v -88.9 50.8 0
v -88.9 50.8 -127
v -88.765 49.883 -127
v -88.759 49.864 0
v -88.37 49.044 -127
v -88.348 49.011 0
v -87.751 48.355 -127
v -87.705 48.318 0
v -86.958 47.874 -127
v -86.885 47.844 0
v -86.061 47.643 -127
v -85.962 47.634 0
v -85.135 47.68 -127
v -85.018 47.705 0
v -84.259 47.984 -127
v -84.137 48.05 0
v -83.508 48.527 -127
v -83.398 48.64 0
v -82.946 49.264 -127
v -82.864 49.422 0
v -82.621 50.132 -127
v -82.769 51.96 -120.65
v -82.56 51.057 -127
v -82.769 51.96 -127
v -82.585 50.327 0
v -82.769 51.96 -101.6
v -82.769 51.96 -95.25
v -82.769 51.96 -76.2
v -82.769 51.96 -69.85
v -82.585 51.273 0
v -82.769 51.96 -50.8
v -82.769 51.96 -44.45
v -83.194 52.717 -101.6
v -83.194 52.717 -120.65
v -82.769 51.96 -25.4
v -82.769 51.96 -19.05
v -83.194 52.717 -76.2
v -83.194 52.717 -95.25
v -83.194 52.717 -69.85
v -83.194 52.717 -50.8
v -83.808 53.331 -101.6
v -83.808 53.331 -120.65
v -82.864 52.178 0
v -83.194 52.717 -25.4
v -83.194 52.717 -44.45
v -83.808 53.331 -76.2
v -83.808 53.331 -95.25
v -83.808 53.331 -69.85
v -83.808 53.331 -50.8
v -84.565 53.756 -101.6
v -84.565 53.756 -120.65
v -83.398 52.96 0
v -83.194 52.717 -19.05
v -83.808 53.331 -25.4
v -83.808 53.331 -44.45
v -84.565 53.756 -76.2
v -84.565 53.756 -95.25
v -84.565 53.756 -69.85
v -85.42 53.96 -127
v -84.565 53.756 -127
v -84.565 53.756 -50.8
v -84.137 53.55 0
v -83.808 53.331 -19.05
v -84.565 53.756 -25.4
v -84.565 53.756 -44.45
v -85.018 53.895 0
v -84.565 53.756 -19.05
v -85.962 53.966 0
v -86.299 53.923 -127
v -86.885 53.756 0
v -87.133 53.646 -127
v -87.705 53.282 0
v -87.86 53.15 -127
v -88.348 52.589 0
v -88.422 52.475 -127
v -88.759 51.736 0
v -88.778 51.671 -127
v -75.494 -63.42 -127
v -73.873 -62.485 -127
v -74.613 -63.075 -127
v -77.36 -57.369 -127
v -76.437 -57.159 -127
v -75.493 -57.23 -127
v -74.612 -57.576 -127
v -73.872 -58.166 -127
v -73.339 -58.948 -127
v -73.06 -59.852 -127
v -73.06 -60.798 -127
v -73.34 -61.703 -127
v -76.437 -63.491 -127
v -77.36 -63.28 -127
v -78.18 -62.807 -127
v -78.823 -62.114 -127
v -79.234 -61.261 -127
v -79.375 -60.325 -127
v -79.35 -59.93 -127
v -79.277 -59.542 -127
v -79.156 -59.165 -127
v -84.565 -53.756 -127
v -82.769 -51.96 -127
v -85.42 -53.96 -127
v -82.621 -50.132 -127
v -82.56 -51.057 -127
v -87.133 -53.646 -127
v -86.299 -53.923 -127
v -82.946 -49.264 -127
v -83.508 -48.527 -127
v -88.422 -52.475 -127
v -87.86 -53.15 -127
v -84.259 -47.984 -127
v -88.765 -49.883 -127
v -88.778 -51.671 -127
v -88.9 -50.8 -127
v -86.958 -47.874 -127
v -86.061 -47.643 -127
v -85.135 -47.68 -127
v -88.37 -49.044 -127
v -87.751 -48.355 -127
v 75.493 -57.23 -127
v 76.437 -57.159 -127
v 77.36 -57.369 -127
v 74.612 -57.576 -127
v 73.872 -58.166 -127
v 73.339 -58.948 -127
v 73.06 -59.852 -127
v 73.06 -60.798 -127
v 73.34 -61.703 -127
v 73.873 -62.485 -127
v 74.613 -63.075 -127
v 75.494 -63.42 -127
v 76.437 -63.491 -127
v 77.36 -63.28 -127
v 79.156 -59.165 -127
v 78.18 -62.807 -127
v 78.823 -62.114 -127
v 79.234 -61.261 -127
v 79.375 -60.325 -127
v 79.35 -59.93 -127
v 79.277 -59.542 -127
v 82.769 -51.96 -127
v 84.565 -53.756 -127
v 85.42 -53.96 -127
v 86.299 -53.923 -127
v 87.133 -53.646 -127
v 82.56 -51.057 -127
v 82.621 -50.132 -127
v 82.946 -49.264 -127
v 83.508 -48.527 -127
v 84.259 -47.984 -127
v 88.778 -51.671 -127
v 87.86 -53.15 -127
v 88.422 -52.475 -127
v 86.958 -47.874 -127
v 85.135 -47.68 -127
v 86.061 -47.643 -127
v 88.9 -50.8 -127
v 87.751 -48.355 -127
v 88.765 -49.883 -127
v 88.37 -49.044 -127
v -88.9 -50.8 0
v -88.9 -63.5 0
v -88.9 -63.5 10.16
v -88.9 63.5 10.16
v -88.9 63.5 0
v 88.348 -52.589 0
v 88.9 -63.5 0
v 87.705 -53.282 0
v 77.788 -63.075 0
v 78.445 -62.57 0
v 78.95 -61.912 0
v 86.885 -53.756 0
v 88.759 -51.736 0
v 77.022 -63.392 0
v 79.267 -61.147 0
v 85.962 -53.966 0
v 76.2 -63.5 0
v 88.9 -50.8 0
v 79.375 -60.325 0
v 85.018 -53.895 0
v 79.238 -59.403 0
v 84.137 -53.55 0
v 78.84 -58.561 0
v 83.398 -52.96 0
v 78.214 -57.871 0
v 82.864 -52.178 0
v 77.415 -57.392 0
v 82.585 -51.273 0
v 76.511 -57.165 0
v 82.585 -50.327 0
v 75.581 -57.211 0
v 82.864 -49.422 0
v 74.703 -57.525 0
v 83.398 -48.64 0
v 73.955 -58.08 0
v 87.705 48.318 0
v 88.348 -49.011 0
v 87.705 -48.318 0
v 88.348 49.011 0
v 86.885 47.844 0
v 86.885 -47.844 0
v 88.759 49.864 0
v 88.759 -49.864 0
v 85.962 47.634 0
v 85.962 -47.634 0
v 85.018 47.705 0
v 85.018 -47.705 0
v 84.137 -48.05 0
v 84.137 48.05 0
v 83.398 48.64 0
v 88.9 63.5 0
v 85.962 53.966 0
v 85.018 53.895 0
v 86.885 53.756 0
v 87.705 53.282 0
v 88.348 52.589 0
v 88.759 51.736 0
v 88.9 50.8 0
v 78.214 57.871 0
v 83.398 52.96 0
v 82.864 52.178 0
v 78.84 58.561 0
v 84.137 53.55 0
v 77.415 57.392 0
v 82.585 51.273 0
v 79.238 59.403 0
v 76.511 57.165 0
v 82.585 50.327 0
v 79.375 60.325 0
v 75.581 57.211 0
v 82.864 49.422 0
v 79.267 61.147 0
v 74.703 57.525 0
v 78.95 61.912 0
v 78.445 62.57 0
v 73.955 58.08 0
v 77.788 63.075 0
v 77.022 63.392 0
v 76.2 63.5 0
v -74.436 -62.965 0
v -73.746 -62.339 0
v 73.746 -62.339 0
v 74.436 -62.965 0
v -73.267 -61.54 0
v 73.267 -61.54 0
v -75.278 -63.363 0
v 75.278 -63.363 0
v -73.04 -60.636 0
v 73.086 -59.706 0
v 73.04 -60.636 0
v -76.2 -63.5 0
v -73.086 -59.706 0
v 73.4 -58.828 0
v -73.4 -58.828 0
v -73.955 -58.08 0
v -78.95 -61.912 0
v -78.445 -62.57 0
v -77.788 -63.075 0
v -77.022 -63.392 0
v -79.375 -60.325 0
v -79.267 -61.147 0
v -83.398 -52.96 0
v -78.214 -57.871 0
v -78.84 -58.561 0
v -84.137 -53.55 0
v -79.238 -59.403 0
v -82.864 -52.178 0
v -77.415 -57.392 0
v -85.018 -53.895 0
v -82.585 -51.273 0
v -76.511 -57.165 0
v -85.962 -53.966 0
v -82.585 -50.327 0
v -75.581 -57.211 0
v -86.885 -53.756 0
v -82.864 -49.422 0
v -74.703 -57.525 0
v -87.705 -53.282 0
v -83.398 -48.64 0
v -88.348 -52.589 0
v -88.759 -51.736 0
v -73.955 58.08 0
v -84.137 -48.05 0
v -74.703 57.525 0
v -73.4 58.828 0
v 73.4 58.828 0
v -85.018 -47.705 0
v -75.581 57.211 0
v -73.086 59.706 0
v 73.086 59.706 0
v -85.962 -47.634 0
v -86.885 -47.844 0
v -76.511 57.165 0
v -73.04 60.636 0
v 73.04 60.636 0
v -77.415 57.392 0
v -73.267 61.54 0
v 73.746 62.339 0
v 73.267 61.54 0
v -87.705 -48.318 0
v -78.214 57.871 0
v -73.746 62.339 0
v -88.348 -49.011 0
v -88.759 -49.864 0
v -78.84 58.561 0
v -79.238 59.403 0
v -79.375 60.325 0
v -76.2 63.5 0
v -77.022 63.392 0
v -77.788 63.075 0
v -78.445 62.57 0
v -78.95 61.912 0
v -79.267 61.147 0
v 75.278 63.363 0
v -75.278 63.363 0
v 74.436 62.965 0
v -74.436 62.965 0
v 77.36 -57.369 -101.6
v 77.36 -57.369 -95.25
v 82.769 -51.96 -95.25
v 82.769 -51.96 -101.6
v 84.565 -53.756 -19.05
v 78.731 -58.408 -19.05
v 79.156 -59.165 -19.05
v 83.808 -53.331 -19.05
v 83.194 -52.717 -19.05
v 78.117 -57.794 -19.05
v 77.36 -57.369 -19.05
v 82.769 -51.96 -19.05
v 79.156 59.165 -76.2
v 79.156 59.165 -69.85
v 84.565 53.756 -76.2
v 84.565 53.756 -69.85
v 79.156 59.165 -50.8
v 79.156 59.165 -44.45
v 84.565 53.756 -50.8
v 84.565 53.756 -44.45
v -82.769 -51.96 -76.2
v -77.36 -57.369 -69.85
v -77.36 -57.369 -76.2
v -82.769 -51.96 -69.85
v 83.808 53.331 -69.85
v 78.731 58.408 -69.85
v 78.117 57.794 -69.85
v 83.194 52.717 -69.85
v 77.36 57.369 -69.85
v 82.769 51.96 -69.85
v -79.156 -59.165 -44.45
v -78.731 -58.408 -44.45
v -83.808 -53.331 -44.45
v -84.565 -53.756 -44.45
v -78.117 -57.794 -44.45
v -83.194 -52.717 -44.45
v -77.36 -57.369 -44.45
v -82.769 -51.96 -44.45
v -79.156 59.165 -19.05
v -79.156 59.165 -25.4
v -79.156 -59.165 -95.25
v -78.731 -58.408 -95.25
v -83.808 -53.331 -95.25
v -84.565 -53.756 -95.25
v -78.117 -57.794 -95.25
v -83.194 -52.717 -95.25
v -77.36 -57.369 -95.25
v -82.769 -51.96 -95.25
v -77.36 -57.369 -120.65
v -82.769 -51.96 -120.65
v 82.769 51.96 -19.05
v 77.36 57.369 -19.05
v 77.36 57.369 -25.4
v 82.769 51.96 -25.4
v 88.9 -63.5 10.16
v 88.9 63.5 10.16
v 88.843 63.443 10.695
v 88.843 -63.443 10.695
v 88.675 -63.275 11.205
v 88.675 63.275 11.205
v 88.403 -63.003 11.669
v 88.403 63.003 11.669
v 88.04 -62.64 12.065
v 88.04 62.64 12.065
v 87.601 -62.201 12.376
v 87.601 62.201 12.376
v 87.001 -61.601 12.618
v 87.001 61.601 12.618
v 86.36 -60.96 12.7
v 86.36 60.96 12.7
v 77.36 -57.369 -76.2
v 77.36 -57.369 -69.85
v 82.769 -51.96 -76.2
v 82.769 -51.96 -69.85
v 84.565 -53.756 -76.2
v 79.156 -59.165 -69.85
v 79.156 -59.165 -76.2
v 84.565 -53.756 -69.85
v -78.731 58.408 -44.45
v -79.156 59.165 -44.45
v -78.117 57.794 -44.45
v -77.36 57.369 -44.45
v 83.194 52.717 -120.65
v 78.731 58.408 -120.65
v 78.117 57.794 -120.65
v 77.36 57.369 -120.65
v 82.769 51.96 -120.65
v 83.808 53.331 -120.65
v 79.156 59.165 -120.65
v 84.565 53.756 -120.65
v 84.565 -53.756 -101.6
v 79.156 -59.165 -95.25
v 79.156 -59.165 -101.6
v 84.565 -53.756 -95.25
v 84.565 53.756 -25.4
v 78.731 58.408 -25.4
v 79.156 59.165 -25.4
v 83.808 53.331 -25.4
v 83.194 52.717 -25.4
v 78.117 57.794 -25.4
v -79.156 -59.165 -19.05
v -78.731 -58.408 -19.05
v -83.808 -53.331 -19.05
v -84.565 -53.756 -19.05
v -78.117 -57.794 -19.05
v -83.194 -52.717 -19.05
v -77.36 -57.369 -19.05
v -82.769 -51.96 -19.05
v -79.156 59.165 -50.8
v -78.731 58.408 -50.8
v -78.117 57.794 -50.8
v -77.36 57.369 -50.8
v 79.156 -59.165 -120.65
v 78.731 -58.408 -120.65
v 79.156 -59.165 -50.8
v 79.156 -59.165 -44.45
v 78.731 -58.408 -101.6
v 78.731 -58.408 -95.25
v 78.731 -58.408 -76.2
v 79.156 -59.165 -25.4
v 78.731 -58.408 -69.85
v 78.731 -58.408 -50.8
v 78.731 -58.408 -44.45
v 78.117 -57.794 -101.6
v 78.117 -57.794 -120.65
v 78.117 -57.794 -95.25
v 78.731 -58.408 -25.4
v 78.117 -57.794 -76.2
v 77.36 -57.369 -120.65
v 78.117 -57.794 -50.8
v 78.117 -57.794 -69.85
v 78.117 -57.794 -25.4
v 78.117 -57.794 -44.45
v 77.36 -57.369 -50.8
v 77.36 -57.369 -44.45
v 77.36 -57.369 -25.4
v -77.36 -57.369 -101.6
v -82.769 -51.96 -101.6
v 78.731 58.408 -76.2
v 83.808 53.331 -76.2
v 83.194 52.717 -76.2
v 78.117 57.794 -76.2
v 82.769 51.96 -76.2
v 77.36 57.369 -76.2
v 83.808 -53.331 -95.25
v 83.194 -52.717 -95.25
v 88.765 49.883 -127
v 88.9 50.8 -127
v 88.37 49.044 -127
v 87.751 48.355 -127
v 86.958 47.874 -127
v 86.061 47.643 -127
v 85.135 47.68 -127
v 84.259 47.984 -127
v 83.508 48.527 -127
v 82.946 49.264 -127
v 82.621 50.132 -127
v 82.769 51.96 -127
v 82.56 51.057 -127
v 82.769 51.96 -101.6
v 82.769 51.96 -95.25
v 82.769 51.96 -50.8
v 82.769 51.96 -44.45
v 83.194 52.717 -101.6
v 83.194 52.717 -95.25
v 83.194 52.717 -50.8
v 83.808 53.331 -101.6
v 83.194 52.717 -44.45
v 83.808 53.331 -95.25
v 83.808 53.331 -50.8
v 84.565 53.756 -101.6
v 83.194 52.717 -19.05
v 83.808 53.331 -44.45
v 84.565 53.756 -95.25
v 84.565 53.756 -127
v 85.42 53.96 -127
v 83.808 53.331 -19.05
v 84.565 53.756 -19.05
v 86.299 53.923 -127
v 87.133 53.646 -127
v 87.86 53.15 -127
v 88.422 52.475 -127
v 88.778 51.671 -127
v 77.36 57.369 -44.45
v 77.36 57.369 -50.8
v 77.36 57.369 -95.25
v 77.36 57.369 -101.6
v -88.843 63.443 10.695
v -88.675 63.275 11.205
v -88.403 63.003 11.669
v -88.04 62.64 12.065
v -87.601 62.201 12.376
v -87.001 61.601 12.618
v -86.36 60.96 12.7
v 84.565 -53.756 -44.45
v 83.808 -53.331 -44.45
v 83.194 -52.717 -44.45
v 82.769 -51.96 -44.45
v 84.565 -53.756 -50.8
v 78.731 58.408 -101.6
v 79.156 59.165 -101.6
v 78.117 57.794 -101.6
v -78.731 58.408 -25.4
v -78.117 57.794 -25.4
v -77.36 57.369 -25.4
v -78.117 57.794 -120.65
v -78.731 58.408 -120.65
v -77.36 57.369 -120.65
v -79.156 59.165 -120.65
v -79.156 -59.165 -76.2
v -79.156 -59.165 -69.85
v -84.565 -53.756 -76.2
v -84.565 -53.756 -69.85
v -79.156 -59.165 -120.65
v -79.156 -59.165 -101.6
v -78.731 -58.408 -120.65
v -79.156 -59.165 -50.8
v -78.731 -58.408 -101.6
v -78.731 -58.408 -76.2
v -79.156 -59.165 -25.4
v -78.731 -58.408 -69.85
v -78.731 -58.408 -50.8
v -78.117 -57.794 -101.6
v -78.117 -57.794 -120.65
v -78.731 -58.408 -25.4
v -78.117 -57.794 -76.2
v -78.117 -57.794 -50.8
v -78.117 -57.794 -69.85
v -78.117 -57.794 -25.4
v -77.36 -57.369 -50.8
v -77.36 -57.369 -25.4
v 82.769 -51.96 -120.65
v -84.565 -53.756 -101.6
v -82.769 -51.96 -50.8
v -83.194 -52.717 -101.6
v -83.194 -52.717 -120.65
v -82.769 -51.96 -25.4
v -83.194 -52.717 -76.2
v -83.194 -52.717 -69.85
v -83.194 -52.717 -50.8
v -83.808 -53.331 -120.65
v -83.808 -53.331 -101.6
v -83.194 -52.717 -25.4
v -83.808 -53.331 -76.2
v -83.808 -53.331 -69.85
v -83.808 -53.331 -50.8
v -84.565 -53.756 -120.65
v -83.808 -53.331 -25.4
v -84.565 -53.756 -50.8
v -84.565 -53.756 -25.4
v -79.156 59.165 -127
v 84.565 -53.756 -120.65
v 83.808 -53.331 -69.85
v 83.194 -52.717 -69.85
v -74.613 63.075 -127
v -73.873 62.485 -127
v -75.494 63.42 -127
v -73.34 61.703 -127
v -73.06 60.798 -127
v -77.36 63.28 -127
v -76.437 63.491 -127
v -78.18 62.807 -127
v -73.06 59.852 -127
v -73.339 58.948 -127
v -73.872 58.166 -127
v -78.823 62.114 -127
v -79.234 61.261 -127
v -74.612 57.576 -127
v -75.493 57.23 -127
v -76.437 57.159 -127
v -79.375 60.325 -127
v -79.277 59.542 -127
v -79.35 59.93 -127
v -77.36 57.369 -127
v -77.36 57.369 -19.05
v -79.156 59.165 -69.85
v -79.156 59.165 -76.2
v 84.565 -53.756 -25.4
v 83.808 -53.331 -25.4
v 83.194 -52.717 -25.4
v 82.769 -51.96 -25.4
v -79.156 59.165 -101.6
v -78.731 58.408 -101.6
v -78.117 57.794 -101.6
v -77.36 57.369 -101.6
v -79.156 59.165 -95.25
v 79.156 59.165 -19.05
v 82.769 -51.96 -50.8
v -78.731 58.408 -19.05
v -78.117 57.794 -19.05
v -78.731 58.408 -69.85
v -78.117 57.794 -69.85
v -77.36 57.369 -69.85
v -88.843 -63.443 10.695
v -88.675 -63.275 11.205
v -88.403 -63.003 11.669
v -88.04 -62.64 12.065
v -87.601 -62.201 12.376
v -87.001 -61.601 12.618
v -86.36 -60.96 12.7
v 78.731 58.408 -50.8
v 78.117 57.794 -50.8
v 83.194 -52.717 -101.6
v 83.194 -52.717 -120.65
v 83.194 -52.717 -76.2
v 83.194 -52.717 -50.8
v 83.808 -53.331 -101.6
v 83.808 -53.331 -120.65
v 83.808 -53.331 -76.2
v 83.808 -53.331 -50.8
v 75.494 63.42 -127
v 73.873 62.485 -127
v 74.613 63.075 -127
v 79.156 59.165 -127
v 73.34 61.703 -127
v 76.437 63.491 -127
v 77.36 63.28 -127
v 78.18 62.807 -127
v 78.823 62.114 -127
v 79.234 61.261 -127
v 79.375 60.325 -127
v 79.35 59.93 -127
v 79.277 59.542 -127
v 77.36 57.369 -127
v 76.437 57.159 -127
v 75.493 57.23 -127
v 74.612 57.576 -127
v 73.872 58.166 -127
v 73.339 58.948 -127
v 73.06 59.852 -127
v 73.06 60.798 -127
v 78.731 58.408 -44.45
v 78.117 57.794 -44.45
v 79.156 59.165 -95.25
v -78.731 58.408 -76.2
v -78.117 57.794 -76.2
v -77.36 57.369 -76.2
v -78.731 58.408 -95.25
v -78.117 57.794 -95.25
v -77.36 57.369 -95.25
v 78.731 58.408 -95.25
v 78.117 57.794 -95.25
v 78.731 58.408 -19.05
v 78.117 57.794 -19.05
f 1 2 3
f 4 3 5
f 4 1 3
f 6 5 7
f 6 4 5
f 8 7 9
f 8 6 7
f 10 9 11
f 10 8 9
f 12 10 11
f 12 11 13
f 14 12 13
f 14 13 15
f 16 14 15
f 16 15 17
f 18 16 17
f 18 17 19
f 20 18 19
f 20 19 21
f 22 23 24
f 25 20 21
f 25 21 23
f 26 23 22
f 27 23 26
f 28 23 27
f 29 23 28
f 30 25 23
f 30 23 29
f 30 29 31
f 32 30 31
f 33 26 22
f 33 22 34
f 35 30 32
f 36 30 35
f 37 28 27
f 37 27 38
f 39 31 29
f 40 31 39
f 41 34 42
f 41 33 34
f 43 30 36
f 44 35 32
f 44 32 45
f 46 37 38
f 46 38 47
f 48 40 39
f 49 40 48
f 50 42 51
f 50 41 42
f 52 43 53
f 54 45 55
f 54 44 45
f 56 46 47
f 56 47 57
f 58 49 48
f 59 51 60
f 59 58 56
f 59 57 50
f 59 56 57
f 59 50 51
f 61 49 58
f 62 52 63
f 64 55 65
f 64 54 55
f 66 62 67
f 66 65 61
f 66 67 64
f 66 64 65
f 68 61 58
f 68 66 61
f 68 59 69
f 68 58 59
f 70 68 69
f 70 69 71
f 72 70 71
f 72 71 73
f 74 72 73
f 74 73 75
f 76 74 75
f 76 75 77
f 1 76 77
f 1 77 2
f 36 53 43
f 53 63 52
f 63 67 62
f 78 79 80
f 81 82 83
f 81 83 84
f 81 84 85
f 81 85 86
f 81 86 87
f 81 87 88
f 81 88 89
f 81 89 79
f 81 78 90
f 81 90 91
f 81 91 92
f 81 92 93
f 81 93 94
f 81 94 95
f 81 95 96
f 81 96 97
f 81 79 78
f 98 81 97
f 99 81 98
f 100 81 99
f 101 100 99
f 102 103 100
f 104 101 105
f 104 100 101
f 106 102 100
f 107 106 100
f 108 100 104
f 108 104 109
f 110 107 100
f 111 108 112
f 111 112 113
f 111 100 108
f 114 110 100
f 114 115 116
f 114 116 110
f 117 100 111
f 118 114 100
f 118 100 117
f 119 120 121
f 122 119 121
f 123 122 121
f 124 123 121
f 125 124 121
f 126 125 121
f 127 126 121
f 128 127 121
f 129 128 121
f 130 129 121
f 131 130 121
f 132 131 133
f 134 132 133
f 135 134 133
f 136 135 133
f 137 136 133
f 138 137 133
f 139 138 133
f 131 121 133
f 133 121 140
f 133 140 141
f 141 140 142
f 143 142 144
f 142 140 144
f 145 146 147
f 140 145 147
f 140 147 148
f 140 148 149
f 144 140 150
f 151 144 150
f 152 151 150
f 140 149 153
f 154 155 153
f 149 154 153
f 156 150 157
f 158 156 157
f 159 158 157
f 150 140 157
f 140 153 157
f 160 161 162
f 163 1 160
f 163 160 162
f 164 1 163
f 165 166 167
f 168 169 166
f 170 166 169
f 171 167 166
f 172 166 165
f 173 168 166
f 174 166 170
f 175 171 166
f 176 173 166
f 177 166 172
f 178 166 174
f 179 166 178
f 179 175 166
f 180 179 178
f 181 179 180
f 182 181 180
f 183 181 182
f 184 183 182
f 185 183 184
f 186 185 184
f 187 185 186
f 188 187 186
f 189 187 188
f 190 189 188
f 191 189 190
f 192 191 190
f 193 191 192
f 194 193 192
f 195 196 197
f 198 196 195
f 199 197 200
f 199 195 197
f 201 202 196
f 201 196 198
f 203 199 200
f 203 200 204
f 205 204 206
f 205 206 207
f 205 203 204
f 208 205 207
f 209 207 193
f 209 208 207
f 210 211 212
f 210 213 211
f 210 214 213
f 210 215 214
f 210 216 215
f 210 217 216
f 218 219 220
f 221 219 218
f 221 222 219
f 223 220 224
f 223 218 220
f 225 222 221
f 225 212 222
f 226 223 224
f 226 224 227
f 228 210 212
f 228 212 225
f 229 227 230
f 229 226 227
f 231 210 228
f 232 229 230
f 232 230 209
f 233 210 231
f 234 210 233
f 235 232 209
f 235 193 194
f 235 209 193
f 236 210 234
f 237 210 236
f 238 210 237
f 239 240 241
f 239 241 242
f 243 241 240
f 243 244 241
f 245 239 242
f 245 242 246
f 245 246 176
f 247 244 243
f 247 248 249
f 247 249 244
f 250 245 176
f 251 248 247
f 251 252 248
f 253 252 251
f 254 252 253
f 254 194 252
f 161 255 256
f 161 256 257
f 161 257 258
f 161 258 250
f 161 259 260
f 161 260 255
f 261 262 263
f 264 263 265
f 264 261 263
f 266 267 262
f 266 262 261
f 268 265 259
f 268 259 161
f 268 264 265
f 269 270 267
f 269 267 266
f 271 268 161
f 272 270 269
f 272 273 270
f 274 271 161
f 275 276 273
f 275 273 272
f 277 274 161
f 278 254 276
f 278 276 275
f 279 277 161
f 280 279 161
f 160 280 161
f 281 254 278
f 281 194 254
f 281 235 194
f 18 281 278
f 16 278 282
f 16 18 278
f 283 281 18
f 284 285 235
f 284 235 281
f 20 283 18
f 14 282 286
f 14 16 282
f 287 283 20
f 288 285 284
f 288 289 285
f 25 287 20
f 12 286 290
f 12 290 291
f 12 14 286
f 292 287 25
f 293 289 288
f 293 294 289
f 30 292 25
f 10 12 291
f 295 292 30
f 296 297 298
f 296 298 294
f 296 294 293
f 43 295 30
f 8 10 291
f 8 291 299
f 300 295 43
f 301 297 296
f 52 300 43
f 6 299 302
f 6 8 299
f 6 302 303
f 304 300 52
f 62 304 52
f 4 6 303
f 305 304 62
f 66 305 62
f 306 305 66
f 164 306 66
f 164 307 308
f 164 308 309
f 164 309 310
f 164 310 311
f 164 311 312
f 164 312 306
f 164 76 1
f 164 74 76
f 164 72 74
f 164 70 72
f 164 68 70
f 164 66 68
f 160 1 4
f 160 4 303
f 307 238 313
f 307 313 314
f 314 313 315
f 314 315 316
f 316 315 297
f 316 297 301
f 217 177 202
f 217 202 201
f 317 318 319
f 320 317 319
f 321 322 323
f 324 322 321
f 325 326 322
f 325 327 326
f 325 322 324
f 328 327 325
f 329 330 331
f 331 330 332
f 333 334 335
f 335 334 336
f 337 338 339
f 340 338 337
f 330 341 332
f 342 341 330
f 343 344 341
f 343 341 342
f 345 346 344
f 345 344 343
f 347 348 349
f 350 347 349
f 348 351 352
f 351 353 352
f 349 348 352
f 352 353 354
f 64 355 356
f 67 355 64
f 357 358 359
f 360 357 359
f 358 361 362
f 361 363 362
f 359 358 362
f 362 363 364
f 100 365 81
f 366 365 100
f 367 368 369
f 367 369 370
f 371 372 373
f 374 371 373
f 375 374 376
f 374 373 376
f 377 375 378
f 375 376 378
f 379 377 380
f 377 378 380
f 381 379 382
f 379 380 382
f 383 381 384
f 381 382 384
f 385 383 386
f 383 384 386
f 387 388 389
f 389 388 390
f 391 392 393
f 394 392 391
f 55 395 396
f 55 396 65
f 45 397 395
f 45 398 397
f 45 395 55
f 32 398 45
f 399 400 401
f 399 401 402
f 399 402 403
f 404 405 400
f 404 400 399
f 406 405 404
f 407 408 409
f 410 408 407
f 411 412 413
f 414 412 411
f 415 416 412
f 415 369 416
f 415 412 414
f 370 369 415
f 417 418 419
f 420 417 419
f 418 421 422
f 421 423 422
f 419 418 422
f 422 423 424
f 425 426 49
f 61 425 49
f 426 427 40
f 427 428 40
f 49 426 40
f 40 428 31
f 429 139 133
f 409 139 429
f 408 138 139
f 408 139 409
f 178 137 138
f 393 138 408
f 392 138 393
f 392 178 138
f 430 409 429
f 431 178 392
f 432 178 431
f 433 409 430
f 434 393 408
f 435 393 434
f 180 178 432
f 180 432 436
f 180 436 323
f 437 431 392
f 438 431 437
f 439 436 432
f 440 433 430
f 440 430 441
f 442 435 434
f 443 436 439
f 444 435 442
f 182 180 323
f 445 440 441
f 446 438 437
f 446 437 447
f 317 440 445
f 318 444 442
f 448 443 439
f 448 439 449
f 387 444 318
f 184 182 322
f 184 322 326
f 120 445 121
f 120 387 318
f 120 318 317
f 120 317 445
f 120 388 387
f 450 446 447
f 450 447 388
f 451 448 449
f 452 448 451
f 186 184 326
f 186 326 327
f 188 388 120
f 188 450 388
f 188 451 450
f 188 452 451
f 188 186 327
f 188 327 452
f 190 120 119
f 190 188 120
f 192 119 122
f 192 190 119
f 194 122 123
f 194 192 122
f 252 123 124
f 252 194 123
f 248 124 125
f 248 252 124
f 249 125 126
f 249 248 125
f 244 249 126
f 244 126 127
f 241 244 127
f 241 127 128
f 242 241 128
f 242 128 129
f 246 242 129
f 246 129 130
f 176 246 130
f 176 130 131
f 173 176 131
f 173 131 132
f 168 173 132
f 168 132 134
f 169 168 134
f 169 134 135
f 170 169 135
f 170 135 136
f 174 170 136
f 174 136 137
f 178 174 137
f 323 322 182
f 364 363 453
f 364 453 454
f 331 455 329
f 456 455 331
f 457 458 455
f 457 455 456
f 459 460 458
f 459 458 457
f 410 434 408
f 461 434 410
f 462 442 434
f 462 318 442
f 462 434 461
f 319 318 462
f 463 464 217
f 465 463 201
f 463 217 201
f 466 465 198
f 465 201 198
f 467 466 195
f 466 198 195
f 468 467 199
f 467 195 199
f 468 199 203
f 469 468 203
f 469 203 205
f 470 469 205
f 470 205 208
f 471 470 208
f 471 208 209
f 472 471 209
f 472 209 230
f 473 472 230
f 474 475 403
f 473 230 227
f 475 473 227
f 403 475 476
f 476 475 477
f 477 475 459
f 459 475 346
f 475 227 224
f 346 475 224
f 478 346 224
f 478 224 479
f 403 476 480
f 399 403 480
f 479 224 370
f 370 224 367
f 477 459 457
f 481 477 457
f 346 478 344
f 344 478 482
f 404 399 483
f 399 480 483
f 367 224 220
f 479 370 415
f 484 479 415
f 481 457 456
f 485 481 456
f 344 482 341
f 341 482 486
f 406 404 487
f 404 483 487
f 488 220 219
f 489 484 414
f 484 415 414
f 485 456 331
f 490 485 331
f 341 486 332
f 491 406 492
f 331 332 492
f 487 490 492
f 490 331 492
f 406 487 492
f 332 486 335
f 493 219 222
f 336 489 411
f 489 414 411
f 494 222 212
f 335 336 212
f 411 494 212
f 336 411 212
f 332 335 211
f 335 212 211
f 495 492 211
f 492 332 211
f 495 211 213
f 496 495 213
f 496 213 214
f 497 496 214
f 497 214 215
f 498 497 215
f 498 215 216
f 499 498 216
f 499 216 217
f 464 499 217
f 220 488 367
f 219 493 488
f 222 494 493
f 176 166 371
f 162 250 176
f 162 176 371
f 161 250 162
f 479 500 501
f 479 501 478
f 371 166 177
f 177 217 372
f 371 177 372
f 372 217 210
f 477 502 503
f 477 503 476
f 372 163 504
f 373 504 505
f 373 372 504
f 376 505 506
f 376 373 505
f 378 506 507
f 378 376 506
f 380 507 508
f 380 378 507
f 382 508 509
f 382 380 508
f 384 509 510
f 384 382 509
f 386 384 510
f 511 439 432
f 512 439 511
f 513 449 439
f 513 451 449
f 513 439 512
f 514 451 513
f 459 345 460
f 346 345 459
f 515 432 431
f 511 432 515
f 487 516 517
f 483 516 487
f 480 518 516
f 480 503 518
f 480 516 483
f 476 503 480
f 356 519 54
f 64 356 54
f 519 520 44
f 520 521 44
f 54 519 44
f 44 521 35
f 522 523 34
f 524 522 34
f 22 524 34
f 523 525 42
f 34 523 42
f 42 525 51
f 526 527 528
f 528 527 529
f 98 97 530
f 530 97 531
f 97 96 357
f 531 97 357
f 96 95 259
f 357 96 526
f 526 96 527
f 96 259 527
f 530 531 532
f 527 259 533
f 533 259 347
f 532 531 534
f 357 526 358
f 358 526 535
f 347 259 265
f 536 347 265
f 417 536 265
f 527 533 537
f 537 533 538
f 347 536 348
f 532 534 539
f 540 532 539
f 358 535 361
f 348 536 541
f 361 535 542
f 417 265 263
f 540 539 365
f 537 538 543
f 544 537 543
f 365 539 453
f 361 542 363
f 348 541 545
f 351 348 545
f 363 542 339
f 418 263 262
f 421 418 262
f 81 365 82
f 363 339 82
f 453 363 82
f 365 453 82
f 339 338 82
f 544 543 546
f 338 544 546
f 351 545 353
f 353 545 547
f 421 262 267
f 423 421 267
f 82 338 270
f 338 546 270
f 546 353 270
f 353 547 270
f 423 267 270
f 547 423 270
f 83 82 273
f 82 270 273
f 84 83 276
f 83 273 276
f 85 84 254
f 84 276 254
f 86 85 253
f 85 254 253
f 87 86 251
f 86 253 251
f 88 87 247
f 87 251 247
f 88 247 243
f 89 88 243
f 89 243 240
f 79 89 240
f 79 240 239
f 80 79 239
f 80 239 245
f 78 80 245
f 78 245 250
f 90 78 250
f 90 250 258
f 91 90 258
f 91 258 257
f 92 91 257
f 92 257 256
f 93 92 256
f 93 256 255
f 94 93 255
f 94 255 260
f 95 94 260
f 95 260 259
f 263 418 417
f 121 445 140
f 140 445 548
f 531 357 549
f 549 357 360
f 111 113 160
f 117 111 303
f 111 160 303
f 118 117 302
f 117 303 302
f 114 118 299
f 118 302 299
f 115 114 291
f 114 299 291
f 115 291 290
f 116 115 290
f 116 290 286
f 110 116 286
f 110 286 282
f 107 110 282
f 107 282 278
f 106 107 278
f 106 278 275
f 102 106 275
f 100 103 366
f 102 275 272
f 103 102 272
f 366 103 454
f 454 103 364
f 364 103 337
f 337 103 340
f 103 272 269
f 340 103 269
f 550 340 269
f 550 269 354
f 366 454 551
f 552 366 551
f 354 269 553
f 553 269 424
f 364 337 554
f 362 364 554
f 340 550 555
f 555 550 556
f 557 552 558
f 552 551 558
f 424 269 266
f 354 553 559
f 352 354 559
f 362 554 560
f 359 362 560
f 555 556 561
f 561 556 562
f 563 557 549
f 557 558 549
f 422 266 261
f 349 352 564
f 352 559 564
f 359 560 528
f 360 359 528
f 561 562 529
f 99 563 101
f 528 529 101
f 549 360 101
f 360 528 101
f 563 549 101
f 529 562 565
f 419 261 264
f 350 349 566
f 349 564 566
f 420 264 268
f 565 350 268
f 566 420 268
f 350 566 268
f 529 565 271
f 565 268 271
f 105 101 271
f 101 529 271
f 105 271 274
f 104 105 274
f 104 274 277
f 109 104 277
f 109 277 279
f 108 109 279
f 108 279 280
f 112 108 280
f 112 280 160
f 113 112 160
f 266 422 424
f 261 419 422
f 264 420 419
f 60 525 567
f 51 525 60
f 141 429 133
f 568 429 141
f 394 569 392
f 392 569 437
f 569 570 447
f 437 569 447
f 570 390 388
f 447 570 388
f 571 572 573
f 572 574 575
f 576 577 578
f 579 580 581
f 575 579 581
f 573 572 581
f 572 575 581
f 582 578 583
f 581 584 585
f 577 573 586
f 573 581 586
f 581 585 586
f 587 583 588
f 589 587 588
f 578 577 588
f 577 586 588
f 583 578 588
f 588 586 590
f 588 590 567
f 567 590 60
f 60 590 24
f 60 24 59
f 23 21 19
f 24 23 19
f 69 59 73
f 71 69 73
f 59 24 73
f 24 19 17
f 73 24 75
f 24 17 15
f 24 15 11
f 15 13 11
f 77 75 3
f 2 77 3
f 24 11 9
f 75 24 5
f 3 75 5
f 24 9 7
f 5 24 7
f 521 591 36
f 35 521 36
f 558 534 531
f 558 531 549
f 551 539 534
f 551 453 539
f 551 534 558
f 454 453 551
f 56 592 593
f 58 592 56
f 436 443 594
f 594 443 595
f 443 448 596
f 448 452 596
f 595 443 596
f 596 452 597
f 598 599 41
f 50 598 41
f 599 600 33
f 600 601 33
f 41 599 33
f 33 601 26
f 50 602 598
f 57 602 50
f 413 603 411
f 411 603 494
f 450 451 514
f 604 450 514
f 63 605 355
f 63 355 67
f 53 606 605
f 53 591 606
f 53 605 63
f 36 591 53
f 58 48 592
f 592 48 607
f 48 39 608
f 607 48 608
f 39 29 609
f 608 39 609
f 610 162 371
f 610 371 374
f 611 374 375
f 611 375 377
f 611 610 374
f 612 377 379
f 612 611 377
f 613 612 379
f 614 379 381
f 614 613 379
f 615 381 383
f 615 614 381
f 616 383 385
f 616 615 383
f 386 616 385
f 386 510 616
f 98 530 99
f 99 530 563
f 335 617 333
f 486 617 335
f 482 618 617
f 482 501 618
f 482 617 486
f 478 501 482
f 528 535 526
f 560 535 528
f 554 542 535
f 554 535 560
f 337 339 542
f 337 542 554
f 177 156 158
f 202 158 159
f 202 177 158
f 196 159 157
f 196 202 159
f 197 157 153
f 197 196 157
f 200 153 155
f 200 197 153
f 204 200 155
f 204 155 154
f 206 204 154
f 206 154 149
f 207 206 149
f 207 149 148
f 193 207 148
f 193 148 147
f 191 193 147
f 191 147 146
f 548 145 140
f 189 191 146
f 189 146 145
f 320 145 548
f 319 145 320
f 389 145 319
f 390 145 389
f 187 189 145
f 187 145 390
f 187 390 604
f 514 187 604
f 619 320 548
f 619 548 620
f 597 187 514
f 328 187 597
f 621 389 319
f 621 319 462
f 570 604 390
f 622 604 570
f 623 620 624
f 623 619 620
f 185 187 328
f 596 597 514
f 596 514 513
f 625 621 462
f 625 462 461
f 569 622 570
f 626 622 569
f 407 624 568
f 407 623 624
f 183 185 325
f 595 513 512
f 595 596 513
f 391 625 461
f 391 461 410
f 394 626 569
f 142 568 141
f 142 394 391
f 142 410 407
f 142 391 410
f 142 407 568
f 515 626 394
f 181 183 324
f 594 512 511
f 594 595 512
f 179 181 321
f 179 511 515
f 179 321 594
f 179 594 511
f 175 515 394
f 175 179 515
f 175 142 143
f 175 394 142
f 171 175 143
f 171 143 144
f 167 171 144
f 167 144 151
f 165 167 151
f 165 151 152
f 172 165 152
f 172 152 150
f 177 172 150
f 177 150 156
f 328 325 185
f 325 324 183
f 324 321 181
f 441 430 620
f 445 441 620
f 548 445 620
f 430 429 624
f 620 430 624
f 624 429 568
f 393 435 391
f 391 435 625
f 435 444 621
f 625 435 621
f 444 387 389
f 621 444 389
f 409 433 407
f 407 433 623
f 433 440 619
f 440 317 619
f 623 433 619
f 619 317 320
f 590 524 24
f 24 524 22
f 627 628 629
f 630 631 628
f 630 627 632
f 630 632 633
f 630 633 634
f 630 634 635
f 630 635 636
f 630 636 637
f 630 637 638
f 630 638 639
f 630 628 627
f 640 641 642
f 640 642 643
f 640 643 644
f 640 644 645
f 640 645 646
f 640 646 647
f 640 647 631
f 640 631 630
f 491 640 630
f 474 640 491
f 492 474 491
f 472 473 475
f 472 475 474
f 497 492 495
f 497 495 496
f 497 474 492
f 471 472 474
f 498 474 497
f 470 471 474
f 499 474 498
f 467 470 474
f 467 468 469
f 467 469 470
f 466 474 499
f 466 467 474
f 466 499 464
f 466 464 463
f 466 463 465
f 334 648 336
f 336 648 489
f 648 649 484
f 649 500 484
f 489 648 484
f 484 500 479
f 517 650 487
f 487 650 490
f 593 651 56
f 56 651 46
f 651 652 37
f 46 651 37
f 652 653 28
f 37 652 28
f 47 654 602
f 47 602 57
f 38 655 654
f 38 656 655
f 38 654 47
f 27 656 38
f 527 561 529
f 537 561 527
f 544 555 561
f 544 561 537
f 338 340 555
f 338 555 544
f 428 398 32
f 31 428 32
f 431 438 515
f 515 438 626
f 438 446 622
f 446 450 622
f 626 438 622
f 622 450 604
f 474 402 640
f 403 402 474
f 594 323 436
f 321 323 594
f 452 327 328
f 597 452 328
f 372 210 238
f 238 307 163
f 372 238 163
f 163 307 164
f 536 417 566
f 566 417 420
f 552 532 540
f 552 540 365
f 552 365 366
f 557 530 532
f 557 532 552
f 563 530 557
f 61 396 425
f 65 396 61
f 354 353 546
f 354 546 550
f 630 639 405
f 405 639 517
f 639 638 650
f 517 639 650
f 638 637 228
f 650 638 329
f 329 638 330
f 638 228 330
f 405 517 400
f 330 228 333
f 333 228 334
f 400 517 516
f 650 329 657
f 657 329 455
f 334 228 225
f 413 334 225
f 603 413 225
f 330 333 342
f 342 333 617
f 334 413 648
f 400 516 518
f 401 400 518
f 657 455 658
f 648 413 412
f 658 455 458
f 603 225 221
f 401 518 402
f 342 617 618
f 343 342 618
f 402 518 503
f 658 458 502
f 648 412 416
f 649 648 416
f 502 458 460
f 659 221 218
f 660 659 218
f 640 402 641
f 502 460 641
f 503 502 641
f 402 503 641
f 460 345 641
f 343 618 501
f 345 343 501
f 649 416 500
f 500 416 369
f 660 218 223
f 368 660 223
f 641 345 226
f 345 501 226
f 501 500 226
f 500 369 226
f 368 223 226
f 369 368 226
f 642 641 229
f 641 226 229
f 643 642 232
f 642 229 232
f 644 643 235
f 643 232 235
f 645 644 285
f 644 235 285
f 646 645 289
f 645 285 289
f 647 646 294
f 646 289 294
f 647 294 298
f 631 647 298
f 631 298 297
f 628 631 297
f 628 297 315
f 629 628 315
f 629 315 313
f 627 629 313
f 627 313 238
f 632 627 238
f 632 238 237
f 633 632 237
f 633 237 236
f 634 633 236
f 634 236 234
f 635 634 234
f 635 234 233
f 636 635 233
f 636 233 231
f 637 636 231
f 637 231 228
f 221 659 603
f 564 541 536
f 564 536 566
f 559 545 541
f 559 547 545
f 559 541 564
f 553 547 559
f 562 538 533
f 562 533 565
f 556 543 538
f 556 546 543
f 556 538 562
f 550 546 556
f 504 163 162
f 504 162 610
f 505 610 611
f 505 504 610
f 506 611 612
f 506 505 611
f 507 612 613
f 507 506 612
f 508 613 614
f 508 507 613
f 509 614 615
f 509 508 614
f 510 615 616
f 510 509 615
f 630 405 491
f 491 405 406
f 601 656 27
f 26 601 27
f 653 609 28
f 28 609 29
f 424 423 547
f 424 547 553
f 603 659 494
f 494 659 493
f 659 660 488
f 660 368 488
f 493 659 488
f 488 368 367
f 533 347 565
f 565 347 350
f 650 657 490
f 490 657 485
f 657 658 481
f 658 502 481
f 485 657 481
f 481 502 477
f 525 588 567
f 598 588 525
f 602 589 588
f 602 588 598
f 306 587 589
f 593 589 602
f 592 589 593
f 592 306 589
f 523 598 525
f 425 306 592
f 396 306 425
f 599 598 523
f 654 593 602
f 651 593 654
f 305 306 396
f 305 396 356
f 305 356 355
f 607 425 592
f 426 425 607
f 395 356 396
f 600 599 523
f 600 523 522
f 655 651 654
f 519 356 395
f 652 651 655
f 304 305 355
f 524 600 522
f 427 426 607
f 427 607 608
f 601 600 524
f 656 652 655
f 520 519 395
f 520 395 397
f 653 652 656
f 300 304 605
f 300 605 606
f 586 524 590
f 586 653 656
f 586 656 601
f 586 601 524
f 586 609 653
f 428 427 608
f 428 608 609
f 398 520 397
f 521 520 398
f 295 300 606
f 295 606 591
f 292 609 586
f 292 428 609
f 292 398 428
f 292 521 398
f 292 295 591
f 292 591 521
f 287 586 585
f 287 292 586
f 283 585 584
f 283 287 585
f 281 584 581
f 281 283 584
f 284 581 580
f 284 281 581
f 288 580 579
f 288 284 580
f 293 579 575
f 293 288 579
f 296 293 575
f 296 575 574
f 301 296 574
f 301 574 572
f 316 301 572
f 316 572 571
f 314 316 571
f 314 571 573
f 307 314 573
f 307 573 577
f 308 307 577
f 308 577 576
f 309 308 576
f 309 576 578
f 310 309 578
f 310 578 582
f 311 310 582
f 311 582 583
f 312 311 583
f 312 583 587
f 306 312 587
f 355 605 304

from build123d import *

# Parameters (mm, degrees)
F0_W         = 177.8
F0_H         = 127
F1_DEPTH     = 12.7
F2_R         = 3.175
F3_DEPTH     = 127
F6_W         = 13.4703841816
F6_H         = 6.35
F7_DEPTH     = 1.27
F8_R         = 2.54
F9_T1_DEPTH  = 10.16
F9_T3_DEPTH  = 7.62
F9_T5_DEPTH  = 10.1599999705
F9_S9_W      = 2.54
F9_S9_H      = 2.54
F9_T10_DEPTH = 2.54
F9_S15_W     = 2.54
F9_S15_H     = 2.54
F9_T16_DEPTH = 2.54
F9_T22_DEPTH = 171.4500000295
F9_S23_R     = 3.175
F9_T24_DEPTH = 87
F9_T28_DEPTH = 120.65
F9_S29_R     = 3.175
F9_T30_DEPTH = 62


# Not quite as in the source:
# - a fillet or chamfer that OpenCascade refuses, or shapes differently, is made with other operations: its cross-section is extruded or revolved along the edge and cut away or added


with BuildPart() as f1:
    # F0 (on Top) → F1 (new body)
    with BuildSketch(Plane.XY):
        Rectangle(F0_W, F0_H)
    extrude(amount=F1_DEPTH)

    # F2 (on Top) → F3 (join)
    with BuildSketch(Plane.XY):
        with Locations((76.2, -60.325)):
            Circle(F2_R)
        with Locations((85.725, -50.8)):
            Circle(F2_R)
    extrude(amount=-F3_DEPTH)

    # F6 (on face) → F7 (join, symmetric)
    with BuildSketch(Plane(origin=(68.2625, -68.2625, 0), x_dir=(0.7071067812, 0.7071067812, 0), z_dir=(0.7071067812, -0.7071067812, 0))):
        with Locations((17.9605122421, -22.225)):
            Rectangle(F6_W, F6_H)
        with Locations((17.9605122421, -47.625)):
            Rectangle(F6_W, F6_H)
        Polygon((11.2253201513, -76.2), (24.6957043329, -76.2), (24.6957043329, -69.85), (11.2336926315, -69.85), (11.2253201513, -69.85), align=None)
        with Locations((17.9605122421, -98.425)):
            Rectangle(F6_W, F6_H)
        with Locations((17.9605122421, -123.825)):
            Rectangle(F6_W, F6_H)
    extrude(amount=F7_DEPTH, both=True)

    # F8
    f8_edges = [f1.edges().sort_by_distance(p)[0] for p in [
        (0, -63.5, 12.7),
        (88.9, 0, 12.7),
        (0, 63.5, 12.7),
        (-88.9, 0, 12.7),
    ]]
    fillet(f8_edges, radius=F8_R)

    # F9: fillet of radius 2.54 on 3 edges, made by hand

    # F9_s2 → F9_t1 (cut)
    with BuildSketch(Plane.XZ.offset(50.8)):
        with BuildLine():
            ThreePointArc((86.36, 0), (88.1560512242, 0.7439487758), (88.9, 2.54))
            Line((88.9, 2.54), (88.9, 0))
            Line((88.9, 0), (86.36, 0))
        make_face()
    extrude(amount=F9_T1_DEPTH, mode=Mode.SUBTRACT)

    # F9_s4 → F9_t3 (cut)
    with BuildSketch(Plane.XY.offset(2.54)):
        with BuildLine():
            ThreePointArc((86.36, -63.5), (88.1560512242, -62.7560512242), (88.9, -60.96))
            Line((88.9, -60.96), (88.9, -63.5))
            Line((88.9, -63.5), (86.36, -63.5))
        make_face()
    extrude(amount=F9_T3_DEPTH, mode=Mode.SUBTRACT)

    # F9_s6 → F9_t5 (cut)
    with BuildSketch(Plane.YZ.offset(76.2000000295)):
        with BuildLine():
            ThreePointArc((-63.5, 2.54), (-62.7560512242, 0.7439487758), (-60.96, 0))
            Line((-60.96, 0), (-63.5, 0))
            Line((-63.5, 0), (-63.5, 2.54))
        make_face()
    extrude(amount=F9_T5_DEPTH, mode=Mode.SUBTRACT)


with BuildPart() as f9_tool8:
    # F9_s9 → F9_t10 (new body)
    with BuildSketch(Plane.XZ.offset(60.96)):
        with Locations((87.63, 11.43)):
            Rectangle(F9_S9_W, F9_S9_H)
    extrude(amount=F9_T10_DEPTH)

    # F9_s11 → F9_t12 (revolve, cut)
    with BuildSketch(Plane(origin=(86.36, -60.96, 10.16), x_dir=(-0.7071067812, 0, -0.7071067812), z_dir=(-0.7071067812, 0, 0.7071067812))):
        with BuildLine():
            ThreePointArc((0, -2.54), (2.54, 0), (0, 2.54))
            Line((0, 2.54), (0, -2.54))
        make_face()
    revolve(axis=Axis((86.36, -60.96, 10.16), (0, -1, 0)), mode=Mode.SUBTRACT)


with BuildPart() as f1_1:
    add(f1.part)

    # F9_t7: cut F9_tool8
    add(f9_tool8.part, mode=Mode.SUBTRACT)


with BuildPart() as f9_tool14:
    # F9_s15 → F9_t16 (new body)
    with BuildSketch(Plane.XZ.offset(60.96)):
        with Locations((87.63, 1.27)):
            Rectangle(F9_S15_W, F9_S15_H)
    extrude(amount=F9_T16_DEPTH)

    # F9_s17 → F9_t18 (revolve, cut)
    with BuildSketch(Plane(origin=(86.36, -60.96, 2.54), x_dir=(-0.7071067812, 0, 0.7071067812), z_dir=(0.7071067812, 0, 0.7071067812))):
        with BuildLine():
            ThreePointArc((0, -2.54), (2.54, 0), (0, 2.54))
            Line((0, 2.54), (0, -2.54))
        make_face()
    revolve(axis=Axis((86.36, -60.96, 2.54), (0, -1, 0)), mode=Mode.SUBTRACT)


with BuildPart() as f1_2:
    add(f1_1.part)

    # F9_t13: cut F9_tool14
    add(f9_tool14.part, mode=Mode.SUBTRACT)


with BuildPart() as f9_tool20:
    # F9_s21 → F9_t22 (new body)
    with BuildSketch(Plane.YZ.offset(-95.25)):
        with BuildLine():
            ThreePointArc((-63.5, 2.54), (-62.7560512242, 0.7439487758), (-60.96, 0))
            Line((-60.96, 0), (-63.5, 0))
            Line((-63.5, 0), (-63.5, 2.54))
        make_face()
    extrude(amount=F9_T22_DEPTH)

    # F9_s23 → F9_t24 (cut, symmetric)
    with BuildSketch(Plane.XY.offset(1.3)):
        with Locations((76.2, -60.325)):
            Circle(F9_S23_R)
    extrude(amount=F9_T24_DEPTH, both=True, mode=Mode.SUBTRACT)


with BuildPart() as f1_3:
    add(f1_2.part)

    # F9_t19: cut F9_tool20
    add(f9_tool20.part, mode=Mode.SUBTRACT)


with BuildPart() as f9_tool26:
    # F9_s27 → F9_t28 (new body)
    with BuildSketch(Plane.XZ.offset(50.8)):
        with BuildLine():
            ThreePointArc((86.36, 0), (88.1560512242, 0.7439487758), (88.9, 2.54))
            Line((88.9, 2.54), (88.9, 0))
            Line((88.9, 0), (86.36, 0))
        make_face()
    extrude(amount=-F9_T28_DEPTH)

    # F9_s29 → F9_t30 (cut, symmetric)
    with BuildSketch(Plane.XY.offset(1.3)):
        with Locations((85.725, -50.8)):
            Circle(F9_S29_R)
    extrude(amount=F9_T30_DEPTH, both=True, mode=Mode.SUBTRACT)


with BuildPart() as f1_4:
    add(f1_3.part)

    # F9_t25: cut F9_tool26
    add(f9_tool26.part, mode=Mode.SUBTRACT)

    # F10: F1 across plane


with BuildPart() as f1_5:
    add(f1_4.part)
    add(f1_4.part.mirror(Plane.YZ))

    # F11: F1 across plane


with BuildPart() as f1_6:
    add(f1_5.part)
    add(f1_5.part.mirror(Plane.XZ))


solid = f1_6.part
